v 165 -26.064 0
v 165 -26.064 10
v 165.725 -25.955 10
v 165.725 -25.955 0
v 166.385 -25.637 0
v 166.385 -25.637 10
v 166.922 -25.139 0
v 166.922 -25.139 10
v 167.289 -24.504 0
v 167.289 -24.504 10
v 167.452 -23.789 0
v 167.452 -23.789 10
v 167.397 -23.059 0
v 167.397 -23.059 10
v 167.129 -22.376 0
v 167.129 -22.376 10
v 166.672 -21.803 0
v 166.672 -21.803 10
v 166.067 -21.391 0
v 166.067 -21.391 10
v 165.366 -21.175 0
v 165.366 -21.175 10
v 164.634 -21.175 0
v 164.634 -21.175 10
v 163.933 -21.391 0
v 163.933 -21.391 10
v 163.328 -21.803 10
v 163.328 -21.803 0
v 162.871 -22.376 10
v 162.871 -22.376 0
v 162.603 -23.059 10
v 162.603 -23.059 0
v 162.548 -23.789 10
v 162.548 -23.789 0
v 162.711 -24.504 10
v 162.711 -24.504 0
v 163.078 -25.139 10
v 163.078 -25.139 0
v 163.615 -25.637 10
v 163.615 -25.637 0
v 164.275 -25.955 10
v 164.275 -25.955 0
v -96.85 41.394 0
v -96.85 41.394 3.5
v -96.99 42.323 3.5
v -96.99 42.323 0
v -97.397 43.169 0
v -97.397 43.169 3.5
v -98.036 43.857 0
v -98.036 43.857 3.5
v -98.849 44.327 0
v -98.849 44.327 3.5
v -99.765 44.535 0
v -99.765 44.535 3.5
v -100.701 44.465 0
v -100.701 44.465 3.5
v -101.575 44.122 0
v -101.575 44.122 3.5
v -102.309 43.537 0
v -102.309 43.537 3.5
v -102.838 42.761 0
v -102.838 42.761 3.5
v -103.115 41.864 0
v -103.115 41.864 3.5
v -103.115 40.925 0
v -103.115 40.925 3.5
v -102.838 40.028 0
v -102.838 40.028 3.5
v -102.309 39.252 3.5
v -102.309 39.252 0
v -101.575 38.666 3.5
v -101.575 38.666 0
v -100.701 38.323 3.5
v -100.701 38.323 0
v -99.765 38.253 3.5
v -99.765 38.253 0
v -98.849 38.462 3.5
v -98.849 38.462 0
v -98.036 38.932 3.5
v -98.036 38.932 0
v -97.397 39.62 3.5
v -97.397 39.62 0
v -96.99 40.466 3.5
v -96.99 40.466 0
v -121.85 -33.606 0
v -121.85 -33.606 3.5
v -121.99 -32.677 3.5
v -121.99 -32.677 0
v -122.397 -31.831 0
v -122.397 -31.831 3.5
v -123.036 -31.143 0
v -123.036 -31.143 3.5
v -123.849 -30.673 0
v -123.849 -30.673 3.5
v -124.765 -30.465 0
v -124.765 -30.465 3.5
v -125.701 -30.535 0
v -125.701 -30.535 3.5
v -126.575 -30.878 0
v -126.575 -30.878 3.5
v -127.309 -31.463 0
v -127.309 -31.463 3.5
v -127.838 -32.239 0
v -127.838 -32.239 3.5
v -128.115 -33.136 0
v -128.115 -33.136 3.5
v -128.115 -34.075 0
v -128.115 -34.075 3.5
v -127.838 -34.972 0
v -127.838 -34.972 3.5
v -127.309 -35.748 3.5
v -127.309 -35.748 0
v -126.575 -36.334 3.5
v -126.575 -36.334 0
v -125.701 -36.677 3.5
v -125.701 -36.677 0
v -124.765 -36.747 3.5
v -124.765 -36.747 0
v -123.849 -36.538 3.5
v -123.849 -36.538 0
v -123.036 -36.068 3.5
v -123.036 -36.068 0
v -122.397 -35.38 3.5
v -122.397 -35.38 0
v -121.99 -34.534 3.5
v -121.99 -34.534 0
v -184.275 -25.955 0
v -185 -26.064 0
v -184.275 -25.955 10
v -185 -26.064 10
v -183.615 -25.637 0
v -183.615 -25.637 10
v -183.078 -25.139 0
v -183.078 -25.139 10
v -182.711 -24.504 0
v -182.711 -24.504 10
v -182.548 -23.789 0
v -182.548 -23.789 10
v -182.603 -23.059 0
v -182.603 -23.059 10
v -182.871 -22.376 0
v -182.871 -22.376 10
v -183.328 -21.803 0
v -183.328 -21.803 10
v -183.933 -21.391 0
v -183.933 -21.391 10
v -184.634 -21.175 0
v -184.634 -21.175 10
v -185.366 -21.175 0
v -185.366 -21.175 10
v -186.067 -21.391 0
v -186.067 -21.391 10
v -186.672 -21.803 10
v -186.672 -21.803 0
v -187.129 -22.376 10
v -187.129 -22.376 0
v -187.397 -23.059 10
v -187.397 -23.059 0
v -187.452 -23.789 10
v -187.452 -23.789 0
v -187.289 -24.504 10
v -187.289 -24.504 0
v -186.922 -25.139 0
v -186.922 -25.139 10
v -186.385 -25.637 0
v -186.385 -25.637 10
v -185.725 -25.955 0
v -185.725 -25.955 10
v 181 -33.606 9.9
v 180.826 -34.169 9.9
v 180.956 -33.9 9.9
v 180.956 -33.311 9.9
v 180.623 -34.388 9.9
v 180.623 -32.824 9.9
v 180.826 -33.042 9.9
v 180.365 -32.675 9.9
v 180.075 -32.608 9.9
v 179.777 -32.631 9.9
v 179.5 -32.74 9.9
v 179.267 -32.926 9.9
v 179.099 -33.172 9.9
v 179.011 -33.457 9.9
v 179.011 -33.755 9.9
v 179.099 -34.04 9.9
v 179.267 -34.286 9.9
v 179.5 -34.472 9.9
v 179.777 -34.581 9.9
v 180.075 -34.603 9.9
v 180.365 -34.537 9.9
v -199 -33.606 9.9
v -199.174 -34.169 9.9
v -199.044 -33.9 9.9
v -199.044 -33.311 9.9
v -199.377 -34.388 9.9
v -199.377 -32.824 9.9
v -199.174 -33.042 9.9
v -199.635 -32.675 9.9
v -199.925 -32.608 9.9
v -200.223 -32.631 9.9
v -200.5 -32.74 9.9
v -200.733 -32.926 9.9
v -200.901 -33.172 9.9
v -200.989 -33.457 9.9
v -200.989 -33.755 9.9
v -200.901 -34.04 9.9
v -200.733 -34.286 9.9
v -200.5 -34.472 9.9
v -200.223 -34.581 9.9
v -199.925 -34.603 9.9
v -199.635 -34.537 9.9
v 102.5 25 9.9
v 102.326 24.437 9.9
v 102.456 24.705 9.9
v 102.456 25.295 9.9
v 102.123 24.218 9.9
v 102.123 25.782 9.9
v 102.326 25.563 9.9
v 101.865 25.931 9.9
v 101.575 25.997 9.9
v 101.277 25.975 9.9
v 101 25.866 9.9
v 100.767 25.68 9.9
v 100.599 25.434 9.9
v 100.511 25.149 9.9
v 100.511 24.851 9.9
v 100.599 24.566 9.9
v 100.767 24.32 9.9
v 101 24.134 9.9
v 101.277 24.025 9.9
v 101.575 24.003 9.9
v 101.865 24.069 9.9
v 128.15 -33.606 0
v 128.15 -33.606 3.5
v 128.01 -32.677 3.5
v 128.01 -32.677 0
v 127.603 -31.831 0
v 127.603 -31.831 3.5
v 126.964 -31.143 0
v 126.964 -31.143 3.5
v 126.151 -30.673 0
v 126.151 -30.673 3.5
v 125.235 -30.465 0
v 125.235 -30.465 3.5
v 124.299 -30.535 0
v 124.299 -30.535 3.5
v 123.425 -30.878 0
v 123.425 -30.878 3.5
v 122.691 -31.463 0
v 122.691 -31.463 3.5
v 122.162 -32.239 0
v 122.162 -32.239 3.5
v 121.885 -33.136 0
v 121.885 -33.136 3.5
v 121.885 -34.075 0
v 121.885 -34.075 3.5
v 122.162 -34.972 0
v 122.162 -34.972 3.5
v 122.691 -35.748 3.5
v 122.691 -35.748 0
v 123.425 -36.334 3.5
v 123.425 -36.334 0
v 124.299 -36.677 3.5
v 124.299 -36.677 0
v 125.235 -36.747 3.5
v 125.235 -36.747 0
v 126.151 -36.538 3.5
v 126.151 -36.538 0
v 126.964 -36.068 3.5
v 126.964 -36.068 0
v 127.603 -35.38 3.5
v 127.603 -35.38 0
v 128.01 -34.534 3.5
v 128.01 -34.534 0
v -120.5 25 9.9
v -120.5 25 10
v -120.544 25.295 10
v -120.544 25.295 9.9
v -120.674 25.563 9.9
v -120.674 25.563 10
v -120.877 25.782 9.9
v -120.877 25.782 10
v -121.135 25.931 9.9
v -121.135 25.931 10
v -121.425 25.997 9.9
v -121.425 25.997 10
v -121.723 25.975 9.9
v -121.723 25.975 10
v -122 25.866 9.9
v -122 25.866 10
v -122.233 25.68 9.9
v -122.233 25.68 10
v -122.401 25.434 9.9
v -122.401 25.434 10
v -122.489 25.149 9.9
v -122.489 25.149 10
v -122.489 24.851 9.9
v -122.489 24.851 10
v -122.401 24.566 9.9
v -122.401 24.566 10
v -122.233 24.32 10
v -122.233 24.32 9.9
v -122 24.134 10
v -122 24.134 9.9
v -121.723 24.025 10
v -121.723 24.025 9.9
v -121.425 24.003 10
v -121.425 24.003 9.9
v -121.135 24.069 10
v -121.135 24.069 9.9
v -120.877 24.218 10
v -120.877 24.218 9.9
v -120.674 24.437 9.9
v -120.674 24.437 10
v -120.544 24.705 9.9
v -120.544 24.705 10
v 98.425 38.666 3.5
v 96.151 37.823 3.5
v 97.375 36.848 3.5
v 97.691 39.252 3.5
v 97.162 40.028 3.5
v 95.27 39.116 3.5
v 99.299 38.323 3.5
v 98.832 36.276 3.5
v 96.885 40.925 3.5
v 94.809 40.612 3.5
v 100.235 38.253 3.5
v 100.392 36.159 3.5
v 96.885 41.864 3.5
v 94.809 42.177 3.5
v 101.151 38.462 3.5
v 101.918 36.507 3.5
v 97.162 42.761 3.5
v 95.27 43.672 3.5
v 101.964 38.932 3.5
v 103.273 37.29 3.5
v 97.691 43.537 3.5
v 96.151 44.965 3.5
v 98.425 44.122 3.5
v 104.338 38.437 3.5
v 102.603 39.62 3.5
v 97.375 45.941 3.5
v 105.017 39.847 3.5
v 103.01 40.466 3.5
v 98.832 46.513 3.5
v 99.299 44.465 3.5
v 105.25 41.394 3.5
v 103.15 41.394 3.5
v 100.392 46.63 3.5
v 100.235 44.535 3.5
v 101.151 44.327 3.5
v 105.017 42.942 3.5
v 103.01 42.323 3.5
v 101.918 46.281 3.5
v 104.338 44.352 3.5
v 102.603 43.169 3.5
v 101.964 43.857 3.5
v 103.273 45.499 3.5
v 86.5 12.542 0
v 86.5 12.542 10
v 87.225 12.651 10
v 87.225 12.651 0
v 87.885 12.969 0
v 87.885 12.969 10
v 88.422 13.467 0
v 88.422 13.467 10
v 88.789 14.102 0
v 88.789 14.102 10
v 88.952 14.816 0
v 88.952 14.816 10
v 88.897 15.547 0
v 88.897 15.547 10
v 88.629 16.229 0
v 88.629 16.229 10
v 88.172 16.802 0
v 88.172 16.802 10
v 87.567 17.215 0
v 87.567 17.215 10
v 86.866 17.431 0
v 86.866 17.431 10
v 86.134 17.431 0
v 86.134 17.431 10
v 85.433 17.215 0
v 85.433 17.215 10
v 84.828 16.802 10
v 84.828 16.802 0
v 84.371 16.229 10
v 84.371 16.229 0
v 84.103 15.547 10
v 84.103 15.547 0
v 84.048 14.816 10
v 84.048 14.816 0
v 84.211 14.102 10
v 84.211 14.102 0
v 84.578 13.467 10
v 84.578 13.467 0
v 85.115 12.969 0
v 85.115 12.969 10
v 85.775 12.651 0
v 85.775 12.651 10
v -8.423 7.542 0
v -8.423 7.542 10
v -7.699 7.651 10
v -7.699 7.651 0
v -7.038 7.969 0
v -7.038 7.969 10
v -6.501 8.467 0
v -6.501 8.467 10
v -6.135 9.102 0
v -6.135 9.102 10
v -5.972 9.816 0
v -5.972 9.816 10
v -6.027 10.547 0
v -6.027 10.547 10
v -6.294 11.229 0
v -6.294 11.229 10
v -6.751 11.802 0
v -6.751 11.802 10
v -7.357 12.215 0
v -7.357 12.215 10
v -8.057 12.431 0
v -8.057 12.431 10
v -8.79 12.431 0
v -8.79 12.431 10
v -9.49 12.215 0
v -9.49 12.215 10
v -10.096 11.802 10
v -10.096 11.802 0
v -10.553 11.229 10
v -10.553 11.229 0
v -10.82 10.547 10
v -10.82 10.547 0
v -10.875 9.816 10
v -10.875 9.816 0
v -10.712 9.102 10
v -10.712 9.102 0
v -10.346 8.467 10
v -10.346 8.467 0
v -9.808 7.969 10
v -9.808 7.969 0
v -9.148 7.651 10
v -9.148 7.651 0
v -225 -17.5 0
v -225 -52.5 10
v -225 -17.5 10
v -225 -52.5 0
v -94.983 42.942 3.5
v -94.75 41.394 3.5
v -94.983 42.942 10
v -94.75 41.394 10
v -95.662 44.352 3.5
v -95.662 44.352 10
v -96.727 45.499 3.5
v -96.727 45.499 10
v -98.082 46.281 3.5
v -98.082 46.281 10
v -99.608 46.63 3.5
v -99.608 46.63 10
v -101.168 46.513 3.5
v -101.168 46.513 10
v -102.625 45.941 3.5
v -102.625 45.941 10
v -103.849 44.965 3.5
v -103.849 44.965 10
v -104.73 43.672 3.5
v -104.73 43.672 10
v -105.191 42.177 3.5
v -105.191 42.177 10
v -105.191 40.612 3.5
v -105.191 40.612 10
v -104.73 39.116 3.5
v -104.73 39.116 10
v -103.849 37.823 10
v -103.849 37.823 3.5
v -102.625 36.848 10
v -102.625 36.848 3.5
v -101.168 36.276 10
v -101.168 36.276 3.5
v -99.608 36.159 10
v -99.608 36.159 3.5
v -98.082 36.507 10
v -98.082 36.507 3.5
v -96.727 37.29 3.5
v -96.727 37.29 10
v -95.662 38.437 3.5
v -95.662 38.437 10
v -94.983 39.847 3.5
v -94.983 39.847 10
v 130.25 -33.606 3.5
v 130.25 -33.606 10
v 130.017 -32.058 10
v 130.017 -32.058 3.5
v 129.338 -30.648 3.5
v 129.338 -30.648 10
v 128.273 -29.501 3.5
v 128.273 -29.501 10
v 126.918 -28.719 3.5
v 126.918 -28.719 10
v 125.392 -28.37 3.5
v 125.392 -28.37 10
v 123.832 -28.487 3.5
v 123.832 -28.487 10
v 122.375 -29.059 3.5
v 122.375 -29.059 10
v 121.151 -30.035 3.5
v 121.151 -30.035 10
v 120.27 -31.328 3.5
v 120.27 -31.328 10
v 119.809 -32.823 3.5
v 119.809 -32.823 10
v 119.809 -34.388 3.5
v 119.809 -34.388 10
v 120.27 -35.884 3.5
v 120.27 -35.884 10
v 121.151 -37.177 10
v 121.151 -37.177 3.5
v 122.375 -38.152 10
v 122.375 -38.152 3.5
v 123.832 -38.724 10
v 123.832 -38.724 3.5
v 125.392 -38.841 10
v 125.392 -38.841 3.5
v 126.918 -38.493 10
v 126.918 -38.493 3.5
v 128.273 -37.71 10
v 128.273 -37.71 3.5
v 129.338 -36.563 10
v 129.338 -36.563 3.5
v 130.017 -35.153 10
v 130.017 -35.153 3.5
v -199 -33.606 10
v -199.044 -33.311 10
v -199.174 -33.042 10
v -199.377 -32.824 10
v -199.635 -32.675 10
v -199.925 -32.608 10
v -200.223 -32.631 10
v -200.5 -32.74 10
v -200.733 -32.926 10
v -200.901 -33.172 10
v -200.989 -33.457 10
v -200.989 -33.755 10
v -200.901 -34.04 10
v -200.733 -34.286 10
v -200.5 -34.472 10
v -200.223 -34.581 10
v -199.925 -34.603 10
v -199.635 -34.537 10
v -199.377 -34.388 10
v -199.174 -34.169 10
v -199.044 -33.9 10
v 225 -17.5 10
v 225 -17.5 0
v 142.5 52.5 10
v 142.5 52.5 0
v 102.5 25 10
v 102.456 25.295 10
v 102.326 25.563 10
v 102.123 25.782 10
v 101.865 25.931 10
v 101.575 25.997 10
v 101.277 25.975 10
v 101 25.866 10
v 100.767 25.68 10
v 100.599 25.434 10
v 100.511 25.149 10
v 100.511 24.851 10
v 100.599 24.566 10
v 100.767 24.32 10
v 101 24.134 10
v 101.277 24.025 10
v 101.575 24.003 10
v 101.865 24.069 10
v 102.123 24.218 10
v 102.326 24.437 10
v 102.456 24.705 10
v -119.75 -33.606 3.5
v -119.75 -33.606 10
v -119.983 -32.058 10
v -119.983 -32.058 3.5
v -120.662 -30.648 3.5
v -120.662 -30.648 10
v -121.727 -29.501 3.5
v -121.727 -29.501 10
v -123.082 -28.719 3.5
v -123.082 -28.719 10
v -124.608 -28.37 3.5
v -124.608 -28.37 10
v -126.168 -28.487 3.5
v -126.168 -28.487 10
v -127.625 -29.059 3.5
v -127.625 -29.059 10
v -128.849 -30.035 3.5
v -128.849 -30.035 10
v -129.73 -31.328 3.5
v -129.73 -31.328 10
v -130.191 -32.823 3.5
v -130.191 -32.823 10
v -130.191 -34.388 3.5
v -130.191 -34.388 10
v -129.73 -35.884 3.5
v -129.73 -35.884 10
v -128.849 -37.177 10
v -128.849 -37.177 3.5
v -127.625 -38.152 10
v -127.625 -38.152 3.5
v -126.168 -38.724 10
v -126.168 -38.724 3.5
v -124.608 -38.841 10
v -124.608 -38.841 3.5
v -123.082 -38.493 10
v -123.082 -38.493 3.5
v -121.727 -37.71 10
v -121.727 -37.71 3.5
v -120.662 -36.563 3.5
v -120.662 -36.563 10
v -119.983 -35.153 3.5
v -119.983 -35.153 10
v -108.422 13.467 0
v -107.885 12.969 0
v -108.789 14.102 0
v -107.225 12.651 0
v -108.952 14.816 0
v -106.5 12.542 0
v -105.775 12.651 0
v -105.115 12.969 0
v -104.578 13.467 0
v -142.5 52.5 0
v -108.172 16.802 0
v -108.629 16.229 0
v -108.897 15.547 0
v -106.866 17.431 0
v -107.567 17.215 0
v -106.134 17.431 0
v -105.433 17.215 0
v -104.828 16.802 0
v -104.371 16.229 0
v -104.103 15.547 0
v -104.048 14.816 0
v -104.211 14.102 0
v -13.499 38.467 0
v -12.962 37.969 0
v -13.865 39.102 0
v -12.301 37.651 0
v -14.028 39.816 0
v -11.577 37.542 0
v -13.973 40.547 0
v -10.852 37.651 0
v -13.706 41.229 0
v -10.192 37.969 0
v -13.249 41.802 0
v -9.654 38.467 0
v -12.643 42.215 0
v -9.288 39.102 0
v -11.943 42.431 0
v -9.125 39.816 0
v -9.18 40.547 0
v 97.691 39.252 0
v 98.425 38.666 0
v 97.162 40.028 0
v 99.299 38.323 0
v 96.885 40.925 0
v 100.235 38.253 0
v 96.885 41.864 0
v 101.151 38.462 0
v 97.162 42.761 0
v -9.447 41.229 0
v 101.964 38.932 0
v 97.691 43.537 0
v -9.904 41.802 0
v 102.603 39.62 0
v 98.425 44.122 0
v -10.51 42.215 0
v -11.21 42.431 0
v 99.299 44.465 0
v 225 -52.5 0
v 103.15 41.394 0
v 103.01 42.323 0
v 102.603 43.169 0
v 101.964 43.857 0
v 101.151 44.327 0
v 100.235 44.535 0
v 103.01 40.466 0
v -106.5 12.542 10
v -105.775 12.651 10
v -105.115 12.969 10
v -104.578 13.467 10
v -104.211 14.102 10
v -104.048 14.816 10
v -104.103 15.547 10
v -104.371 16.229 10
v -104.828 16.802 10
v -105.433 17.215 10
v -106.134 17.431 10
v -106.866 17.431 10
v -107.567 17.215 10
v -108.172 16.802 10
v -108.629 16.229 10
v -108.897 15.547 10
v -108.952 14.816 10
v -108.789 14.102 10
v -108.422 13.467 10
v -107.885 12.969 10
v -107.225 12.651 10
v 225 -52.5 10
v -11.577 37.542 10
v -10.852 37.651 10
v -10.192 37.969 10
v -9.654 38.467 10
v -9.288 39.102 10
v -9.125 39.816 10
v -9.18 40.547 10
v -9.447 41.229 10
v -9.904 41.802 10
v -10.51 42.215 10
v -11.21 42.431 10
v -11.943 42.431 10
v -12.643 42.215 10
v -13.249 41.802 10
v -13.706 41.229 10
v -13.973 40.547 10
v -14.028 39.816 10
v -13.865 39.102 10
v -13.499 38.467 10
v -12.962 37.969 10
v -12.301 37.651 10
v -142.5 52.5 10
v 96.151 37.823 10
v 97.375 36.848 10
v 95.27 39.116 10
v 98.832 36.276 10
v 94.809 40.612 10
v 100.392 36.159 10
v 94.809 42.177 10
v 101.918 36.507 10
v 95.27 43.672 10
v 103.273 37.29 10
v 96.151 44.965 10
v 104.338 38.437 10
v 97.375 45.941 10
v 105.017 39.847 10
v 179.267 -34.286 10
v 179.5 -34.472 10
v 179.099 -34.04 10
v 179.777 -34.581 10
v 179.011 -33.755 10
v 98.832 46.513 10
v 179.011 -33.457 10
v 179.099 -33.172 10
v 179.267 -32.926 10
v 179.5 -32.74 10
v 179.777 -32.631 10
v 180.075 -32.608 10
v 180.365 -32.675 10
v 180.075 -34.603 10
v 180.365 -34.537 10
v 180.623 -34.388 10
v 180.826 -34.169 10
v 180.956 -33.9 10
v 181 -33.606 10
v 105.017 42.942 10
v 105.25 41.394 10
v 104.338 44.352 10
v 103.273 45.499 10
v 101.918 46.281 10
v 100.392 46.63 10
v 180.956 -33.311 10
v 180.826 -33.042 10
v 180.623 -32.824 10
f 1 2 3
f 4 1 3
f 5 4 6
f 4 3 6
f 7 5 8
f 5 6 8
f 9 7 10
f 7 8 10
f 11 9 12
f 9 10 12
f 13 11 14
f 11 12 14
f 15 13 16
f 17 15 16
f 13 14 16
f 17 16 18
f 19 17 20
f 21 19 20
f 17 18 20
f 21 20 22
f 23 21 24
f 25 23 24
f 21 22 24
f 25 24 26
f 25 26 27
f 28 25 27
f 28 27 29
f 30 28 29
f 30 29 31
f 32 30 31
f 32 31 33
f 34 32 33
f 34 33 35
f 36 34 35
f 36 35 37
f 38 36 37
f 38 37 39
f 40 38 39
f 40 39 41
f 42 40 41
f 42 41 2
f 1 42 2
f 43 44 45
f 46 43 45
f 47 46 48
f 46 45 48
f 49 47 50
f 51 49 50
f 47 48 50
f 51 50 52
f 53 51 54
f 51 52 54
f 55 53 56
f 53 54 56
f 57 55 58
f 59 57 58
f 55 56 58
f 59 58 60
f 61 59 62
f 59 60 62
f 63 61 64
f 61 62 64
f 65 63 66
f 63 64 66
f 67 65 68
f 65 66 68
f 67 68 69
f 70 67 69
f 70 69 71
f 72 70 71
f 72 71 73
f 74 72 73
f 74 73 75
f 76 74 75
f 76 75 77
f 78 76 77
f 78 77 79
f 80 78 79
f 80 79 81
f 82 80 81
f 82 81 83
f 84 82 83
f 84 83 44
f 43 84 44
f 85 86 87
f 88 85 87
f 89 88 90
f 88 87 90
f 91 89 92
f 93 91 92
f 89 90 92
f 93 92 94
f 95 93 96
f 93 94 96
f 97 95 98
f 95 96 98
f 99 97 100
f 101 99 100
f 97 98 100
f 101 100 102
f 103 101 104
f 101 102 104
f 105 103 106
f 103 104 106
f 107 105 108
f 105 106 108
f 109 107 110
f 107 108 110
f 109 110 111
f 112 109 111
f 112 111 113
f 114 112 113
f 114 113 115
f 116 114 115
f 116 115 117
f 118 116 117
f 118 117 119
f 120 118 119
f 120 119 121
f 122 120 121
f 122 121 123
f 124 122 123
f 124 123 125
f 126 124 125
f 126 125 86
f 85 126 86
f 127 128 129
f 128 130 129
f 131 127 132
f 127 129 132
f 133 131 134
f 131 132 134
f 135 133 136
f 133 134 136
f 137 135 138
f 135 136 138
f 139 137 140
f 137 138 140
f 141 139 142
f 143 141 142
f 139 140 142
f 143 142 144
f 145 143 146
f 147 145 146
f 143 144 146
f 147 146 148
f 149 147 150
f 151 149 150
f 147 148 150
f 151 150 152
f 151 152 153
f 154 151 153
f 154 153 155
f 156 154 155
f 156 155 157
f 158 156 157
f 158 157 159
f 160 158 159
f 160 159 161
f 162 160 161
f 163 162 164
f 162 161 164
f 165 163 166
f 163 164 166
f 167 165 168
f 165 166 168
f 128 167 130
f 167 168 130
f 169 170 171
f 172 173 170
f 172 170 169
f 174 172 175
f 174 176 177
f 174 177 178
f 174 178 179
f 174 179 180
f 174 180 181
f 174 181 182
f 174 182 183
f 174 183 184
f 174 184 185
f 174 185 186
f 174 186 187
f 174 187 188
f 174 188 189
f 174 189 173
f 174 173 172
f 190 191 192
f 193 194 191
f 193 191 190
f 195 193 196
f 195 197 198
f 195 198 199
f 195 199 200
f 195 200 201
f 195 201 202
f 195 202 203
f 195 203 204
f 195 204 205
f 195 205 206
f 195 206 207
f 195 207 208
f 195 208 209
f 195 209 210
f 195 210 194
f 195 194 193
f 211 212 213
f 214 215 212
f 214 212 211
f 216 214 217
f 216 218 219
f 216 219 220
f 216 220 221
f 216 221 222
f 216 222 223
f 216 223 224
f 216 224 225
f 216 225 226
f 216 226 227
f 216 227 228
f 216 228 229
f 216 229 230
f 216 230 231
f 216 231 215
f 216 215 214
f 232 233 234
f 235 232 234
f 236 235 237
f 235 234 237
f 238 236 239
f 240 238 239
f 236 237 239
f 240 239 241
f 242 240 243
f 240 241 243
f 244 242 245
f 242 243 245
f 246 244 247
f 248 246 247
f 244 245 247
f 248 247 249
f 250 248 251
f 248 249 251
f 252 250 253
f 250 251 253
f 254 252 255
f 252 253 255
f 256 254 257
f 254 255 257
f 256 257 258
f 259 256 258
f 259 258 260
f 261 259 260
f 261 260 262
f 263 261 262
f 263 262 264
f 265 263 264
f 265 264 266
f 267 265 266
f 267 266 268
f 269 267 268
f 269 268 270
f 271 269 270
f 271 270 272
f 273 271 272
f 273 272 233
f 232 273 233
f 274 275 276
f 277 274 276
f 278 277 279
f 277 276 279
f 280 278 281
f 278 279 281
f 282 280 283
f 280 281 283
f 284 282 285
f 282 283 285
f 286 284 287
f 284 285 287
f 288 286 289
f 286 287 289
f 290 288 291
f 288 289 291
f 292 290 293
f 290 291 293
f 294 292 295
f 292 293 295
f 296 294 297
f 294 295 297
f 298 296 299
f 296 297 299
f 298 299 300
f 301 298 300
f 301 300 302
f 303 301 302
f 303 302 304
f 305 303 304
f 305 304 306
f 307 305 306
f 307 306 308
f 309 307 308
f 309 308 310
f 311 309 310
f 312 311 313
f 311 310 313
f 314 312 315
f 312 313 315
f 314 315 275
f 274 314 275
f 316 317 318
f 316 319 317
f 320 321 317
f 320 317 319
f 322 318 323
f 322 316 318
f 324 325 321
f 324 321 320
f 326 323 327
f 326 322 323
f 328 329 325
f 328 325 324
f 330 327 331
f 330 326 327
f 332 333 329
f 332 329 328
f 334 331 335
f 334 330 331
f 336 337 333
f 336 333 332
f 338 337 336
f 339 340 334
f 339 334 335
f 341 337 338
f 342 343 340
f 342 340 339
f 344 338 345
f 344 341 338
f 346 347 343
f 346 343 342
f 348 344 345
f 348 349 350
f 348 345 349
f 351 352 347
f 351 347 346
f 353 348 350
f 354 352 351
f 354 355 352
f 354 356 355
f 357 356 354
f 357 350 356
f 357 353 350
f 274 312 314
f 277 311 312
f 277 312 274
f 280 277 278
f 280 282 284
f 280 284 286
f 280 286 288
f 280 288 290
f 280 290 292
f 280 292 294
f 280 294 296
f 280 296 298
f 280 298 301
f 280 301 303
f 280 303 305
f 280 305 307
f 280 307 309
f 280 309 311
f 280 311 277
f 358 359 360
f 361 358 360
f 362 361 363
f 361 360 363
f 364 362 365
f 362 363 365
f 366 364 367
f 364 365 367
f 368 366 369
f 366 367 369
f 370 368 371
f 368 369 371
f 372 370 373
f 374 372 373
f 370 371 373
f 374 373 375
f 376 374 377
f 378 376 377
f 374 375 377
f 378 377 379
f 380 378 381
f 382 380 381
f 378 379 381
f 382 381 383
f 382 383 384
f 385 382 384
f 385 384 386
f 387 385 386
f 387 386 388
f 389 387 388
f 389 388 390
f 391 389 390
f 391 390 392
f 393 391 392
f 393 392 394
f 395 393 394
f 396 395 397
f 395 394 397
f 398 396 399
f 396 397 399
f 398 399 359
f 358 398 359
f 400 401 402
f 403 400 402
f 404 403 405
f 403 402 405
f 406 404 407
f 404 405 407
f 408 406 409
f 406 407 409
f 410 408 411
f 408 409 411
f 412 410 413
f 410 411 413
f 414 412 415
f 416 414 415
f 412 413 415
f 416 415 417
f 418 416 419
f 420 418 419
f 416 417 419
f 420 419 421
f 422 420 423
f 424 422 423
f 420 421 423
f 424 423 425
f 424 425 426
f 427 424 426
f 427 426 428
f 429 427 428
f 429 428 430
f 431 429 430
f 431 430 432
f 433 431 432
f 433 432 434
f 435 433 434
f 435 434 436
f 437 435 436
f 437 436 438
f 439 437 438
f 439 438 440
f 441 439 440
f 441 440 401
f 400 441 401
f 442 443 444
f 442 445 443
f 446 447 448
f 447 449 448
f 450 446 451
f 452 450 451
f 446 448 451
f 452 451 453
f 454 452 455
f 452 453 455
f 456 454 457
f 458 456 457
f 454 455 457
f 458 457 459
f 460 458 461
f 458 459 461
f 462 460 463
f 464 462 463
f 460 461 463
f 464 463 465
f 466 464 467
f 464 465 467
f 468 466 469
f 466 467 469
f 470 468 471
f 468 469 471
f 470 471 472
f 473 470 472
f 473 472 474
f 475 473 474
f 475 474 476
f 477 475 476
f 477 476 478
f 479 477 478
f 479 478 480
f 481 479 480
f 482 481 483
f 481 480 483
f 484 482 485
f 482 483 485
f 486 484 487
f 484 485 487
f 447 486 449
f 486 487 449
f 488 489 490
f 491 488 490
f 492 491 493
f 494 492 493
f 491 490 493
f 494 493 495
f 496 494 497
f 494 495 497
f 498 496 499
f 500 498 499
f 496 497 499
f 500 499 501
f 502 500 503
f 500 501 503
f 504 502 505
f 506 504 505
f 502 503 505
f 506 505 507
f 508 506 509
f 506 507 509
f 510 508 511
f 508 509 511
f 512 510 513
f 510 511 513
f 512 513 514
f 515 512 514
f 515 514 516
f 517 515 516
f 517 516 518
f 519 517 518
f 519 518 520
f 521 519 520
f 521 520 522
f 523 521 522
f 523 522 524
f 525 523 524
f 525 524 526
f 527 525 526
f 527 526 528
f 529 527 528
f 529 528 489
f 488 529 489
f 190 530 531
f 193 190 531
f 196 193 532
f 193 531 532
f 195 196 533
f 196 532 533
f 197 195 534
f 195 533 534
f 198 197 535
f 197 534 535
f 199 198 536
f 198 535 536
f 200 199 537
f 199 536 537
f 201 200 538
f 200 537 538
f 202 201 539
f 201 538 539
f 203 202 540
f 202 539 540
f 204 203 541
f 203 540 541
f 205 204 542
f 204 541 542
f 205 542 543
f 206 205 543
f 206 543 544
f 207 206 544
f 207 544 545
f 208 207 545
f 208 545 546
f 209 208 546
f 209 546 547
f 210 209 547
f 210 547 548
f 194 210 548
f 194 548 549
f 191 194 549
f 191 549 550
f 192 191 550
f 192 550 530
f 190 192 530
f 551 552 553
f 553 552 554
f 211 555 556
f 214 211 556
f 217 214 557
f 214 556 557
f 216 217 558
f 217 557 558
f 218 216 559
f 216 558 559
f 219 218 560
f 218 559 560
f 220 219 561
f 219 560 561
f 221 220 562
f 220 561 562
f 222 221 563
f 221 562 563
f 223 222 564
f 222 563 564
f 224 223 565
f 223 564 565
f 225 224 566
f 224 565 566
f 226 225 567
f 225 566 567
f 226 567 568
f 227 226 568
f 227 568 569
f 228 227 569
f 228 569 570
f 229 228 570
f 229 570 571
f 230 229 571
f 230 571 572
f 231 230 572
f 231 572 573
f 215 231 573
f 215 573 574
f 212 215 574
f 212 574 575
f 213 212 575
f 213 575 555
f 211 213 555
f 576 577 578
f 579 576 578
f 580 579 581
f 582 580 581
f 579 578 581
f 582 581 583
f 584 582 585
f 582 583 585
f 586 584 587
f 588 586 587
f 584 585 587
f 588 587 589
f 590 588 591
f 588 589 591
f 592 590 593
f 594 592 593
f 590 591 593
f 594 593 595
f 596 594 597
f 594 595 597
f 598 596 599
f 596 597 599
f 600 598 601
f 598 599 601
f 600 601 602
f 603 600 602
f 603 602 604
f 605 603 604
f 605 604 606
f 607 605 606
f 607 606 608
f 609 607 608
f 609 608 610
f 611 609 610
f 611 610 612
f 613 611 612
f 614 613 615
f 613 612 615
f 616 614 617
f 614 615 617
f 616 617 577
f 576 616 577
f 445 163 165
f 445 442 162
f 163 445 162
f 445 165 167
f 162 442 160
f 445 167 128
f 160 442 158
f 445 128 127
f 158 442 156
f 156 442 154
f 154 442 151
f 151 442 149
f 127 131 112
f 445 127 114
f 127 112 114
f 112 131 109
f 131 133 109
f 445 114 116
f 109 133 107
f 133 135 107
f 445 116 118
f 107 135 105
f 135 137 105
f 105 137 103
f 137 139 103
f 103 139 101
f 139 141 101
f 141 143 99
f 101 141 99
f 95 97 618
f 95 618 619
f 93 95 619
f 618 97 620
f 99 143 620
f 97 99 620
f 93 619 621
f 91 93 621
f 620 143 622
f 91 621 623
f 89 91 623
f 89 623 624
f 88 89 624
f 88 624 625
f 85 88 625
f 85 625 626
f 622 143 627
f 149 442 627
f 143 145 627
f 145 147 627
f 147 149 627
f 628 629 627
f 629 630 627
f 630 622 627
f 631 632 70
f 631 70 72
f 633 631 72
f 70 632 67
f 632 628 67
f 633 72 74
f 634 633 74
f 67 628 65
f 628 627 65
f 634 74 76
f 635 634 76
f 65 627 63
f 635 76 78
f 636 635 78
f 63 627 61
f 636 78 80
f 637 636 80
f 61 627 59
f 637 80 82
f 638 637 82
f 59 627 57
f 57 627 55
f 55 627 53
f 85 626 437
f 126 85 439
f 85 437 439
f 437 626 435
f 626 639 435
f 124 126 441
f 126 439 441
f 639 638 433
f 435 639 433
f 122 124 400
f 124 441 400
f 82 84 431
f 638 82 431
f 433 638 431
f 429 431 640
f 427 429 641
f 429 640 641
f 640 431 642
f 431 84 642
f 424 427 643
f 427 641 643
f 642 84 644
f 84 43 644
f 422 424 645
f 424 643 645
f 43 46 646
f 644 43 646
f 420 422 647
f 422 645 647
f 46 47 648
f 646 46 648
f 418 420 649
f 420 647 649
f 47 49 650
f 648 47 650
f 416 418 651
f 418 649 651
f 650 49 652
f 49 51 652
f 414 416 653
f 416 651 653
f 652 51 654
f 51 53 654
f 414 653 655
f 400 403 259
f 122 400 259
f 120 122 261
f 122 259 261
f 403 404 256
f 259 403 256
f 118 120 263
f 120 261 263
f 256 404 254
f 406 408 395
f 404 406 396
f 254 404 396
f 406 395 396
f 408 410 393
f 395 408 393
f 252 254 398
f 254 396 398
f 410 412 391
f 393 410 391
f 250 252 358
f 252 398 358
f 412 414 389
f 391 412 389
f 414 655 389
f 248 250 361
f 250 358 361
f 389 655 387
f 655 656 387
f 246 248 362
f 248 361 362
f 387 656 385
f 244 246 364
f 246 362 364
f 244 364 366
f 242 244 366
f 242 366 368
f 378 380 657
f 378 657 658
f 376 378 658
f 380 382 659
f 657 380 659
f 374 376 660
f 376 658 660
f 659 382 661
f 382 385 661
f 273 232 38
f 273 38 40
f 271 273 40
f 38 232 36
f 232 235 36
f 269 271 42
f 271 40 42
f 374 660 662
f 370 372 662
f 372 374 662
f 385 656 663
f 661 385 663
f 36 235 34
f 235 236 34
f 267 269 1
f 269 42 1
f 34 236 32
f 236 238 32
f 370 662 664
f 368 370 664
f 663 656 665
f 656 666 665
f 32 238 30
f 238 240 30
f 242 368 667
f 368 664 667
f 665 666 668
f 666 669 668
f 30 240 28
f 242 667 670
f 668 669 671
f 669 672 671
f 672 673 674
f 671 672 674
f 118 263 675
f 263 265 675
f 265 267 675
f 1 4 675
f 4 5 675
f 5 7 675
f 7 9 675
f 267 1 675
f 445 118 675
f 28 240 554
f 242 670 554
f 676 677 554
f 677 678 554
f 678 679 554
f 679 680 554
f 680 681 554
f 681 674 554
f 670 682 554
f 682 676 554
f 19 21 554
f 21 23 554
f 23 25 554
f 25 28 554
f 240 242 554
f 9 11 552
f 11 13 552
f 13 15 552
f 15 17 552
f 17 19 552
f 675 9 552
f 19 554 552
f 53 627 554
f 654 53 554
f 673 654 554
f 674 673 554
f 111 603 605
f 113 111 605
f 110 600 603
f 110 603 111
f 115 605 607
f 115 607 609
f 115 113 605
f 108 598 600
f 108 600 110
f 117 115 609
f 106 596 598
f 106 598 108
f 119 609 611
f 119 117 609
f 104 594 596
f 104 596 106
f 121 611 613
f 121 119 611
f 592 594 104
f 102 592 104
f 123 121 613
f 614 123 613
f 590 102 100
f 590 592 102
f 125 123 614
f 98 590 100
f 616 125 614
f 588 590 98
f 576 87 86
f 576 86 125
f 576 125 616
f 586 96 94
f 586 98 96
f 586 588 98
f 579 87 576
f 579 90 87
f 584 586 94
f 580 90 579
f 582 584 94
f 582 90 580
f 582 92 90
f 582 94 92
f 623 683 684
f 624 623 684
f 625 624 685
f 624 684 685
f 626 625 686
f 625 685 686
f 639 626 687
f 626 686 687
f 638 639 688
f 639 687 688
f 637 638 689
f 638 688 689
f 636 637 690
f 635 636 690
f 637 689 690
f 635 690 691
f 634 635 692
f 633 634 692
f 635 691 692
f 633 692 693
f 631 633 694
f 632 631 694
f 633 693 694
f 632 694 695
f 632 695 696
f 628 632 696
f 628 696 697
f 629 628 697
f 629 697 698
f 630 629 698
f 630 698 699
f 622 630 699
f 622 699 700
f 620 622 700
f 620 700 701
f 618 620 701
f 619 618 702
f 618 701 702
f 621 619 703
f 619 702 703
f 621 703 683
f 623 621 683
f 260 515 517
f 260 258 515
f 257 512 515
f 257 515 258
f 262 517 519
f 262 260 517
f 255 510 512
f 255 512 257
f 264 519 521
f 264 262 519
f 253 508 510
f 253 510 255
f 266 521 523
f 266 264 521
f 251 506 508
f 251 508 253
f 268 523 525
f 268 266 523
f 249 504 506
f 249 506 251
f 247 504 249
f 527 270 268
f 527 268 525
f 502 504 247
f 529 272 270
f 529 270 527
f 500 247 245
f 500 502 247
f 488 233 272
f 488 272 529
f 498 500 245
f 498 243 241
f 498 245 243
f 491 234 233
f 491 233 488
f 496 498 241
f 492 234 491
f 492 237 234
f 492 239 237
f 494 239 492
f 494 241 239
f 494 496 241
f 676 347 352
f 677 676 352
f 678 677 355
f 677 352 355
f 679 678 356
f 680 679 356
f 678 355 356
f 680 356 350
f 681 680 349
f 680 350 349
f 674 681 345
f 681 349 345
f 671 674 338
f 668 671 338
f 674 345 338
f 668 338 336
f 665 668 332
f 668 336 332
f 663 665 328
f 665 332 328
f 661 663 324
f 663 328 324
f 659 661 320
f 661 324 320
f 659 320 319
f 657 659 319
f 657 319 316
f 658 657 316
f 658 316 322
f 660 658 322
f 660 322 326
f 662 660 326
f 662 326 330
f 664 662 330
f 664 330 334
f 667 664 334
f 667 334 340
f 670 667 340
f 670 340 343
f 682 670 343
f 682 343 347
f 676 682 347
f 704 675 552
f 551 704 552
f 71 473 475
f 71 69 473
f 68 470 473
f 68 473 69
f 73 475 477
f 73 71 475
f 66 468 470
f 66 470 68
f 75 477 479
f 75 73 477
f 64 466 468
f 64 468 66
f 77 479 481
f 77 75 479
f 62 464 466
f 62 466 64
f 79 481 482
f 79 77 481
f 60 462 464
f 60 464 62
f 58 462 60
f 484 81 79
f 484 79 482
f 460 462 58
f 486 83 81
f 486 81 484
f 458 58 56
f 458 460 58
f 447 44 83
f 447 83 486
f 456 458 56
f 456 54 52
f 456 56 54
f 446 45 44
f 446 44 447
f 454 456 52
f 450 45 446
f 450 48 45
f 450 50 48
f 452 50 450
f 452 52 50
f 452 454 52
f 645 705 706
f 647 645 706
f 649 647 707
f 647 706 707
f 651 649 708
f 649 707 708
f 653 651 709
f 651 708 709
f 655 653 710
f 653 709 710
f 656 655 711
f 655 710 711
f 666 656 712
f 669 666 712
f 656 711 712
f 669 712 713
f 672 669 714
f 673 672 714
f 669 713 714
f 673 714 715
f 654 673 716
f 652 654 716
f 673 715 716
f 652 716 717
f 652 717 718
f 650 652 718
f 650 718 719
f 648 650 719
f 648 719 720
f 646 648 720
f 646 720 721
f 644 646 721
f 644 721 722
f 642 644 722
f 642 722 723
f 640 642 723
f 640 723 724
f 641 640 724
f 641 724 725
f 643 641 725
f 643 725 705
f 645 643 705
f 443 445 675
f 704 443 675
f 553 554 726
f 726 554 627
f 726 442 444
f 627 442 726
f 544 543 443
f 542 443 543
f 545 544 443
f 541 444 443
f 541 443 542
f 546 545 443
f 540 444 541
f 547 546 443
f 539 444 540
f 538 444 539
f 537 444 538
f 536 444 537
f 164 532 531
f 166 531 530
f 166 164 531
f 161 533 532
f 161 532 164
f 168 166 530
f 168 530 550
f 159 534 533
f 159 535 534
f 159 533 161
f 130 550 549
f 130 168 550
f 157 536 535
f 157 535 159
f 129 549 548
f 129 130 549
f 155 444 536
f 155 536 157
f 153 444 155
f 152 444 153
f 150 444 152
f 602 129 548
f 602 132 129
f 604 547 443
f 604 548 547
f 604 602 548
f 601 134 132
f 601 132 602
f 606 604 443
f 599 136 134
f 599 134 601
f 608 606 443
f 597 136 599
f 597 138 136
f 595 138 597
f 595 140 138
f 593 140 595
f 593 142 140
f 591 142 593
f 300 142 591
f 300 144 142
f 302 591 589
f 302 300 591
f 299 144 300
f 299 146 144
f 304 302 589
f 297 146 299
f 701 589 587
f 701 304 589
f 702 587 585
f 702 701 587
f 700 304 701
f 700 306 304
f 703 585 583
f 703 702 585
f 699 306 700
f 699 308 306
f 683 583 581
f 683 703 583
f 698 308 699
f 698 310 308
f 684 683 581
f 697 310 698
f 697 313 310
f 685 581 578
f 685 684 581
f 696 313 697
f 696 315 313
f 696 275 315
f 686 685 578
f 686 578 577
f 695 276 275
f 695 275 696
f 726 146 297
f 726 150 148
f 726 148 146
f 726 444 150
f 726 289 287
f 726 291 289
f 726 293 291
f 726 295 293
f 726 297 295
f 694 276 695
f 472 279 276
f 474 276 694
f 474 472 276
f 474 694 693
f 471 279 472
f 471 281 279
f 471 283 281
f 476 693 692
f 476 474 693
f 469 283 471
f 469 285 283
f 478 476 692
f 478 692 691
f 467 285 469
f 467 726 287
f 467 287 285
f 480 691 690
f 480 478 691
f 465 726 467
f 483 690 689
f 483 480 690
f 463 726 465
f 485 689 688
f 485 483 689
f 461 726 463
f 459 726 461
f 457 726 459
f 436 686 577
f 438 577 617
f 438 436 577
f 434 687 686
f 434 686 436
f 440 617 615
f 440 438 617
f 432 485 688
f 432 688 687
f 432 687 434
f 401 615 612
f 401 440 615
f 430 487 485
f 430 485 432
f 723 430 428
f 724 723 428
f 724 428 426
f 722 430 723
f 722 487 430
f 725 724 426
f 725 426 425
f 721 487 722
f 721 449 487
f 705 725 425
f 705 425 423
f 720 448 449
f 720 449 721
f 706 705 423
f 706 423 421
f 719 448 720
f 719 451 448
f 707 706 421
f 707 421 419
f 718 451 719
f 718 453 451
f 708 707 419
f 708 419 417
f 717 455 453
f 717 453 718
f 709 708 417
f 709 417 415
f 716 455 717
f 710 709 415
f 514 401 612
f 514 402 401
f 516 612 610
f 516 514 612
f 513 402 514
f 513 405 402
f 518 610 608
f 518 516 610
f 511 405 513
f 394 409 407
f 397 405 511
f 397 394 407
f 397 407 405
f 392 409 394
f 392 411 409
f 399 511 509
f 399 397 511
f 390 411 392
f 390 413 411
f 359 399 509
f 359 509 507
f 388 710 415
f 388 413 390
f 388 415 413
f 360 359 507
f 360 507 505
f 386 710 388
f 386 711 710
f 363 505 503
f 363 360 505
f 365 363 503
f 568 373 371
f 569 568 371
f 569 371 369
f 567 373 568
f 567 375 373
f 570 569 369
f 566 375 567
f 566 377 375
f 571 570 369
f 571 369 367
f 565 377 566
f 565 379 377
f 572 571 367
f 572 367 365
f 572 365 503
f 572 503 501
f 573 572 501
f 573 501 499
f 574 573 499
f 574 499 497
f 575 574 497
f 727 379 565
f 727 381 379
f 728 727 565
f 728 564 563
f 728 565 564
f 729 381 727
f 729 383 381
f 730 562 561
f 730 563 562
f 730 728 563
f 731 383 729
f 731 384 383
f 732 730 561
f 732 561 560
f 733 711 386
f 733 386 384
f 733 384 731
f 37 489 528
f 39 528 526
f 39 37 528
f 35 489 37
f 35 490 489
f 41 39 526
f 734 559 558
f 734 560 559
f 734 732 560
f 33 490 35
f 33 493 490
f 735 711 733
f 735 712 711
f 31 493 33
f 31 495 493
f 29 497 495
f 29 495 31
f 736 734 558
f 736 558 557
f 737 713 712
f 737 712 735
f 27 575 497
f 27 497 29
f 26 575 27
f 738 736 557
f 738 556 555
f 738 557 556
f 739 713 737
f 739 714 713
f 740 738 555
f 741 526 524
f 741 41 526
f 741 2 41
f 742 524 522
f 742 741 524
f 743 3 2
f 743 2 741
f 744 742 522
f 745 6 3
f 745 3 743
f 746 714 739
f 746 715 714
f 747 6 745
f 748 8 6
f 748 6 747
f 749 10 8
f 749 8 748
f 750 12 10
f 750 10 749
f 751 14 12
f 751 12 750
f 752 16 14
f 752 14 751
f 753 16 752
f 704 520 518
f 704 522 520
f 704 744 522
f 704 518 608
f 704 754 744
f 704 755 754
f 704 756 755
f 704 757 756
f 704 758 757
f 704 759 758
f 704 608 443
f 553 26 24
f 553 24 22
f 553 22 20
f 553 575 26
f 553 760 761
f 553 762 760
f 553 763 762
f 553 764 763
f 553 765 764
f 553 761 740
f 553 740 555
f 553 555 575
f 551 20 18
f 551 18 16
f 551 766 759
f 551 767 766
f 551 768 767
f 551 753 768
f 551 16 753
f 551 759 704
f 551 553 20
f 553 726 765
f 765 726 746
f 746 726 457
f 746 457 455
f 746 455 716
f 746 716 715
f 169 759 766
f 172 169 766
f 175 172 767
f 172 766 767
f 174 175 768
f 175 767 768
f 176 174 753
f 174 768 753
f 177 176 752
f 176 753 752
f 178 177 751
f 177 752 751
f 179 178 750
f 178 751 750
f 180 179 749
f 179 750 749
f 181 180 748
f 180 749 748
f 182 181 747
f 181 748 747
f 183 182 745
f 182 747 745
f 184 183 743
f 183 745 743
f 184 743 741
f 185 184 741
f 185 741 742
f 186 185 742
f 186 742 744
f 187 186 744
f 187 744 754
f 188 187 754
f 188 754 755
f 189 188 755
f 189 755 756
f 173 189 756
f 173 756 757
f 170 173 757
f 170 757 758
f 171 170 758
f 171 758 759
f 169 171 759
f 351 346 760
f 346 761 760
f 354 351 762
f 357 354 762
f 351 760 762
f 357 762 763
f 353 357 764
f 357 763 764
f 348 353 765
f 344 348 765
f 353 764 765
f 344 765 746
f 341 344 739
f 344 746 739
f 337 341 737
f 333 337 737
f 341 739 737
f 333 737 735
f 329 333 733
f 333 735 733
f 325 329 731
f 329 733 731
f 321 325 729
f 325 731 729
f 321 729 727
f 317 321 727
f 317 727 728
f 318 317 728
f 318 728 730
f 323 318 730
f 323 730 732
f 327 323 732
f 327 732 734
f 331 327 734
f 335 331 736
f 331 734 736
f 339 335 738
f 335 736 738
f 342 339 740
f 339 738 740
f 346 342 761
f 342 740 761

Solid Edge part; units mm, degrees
sketch "Sketch1" plane through (0, 0, 0) normal (0, 0, 1) x (1, 0, 0)
  line L0 (-225, -52.5) -> (225, -52.5)
  line L1 (225, -52.5) -> (225, -17.5)
  line L2 (225, -17.5) -> (142.5, 52.5)
  line L3 (142.5, 52.5) -> (-142.5, 52.5)
  line L4 (-225, -17.5) -> (-142.5, 52.5)
  line L5 (-225, -52.5) -> (-225, -17.5)
  dimension "D1" = 285
  dimension "D2" = 450
  dimension "D3" = 105
  dimension "D4" = 52.5
  dimension "D5" = 35
  dimension "D6" = 35
extrude "Protrusion1" add sketch "Sketch1" along normal blind 10
hole "Hole1" at (-8.4234, 10, 10) direction (0, 0, -1) diameter 4.917 end up to next
hole "Hole2" at (-11.5766, 40, 10) direction (0, 0, -1) diameter 4.917 end up to next
hole "Hole3" at (-185, -23.6057, 10) direction (0, 0, -1) diameter 4.917 end up to next
hole "Hole4" at (-106.5, 15, 10) direction (0, 0, -1) diameter 4.917 end up to next
hole "Hole5" at (86.5, 15, 10) direction (0, 0, -1) diameter 4.917 end up to next
hole "Hole6" at (165, -23.6057, 10) direction (0, 0, -1) diameter 4.917 end up to next
sketch "Sketch2" plane through (0, 0, 10) normal (0, 0, 1) x (1, 0, 0)
  circle A0 centre (-200, -33.6057) radius 1
  circle A1 centre (-121.5, 25) radius 1
  circle A2 centre (101.5, 25) radius 1
  circle A3 centre (180, -33.6057) radius 1
extrude "Mirrormarks" cut sketch "Sketch2" against normal blind 0.1
sketch "Sketch3" plane through (0, 0, 10) normal (0, 0, 1) x (1, 0, 0)
  circle A0 centre (125, -33.6057) radius 5.25
  circle A1 centre (100, 41.3943) radius 5.25
  circle A2 centre (-100, 41.3943) radius 5.25
  circle A3 centre (-125, -33.6057) radius 5.25
  dimension "D1" = 250
  dimension "D2" = 125
  dimension "D3" = 75
  dimension "D4" = 200
  dimension "D5" = 25
extrude "Mounting_screws" cut sketch "Sketch3" against normal blind 6.5
sketch "Sketch4" plane through (-125, 41.3943, 3.5) normal (0, 0, 1) x (1, 0, 0)
  circle A0 centre (25, 0) radius 3.15
  circle A1 centre (225, 0) radius 3.15
  circle A2 centre (250, -75) radius 3.15
  circle A3 centre (0, -75) radius 3.15
extrude "Cutout1" cut sketch "Sketch4" against normal up to next
